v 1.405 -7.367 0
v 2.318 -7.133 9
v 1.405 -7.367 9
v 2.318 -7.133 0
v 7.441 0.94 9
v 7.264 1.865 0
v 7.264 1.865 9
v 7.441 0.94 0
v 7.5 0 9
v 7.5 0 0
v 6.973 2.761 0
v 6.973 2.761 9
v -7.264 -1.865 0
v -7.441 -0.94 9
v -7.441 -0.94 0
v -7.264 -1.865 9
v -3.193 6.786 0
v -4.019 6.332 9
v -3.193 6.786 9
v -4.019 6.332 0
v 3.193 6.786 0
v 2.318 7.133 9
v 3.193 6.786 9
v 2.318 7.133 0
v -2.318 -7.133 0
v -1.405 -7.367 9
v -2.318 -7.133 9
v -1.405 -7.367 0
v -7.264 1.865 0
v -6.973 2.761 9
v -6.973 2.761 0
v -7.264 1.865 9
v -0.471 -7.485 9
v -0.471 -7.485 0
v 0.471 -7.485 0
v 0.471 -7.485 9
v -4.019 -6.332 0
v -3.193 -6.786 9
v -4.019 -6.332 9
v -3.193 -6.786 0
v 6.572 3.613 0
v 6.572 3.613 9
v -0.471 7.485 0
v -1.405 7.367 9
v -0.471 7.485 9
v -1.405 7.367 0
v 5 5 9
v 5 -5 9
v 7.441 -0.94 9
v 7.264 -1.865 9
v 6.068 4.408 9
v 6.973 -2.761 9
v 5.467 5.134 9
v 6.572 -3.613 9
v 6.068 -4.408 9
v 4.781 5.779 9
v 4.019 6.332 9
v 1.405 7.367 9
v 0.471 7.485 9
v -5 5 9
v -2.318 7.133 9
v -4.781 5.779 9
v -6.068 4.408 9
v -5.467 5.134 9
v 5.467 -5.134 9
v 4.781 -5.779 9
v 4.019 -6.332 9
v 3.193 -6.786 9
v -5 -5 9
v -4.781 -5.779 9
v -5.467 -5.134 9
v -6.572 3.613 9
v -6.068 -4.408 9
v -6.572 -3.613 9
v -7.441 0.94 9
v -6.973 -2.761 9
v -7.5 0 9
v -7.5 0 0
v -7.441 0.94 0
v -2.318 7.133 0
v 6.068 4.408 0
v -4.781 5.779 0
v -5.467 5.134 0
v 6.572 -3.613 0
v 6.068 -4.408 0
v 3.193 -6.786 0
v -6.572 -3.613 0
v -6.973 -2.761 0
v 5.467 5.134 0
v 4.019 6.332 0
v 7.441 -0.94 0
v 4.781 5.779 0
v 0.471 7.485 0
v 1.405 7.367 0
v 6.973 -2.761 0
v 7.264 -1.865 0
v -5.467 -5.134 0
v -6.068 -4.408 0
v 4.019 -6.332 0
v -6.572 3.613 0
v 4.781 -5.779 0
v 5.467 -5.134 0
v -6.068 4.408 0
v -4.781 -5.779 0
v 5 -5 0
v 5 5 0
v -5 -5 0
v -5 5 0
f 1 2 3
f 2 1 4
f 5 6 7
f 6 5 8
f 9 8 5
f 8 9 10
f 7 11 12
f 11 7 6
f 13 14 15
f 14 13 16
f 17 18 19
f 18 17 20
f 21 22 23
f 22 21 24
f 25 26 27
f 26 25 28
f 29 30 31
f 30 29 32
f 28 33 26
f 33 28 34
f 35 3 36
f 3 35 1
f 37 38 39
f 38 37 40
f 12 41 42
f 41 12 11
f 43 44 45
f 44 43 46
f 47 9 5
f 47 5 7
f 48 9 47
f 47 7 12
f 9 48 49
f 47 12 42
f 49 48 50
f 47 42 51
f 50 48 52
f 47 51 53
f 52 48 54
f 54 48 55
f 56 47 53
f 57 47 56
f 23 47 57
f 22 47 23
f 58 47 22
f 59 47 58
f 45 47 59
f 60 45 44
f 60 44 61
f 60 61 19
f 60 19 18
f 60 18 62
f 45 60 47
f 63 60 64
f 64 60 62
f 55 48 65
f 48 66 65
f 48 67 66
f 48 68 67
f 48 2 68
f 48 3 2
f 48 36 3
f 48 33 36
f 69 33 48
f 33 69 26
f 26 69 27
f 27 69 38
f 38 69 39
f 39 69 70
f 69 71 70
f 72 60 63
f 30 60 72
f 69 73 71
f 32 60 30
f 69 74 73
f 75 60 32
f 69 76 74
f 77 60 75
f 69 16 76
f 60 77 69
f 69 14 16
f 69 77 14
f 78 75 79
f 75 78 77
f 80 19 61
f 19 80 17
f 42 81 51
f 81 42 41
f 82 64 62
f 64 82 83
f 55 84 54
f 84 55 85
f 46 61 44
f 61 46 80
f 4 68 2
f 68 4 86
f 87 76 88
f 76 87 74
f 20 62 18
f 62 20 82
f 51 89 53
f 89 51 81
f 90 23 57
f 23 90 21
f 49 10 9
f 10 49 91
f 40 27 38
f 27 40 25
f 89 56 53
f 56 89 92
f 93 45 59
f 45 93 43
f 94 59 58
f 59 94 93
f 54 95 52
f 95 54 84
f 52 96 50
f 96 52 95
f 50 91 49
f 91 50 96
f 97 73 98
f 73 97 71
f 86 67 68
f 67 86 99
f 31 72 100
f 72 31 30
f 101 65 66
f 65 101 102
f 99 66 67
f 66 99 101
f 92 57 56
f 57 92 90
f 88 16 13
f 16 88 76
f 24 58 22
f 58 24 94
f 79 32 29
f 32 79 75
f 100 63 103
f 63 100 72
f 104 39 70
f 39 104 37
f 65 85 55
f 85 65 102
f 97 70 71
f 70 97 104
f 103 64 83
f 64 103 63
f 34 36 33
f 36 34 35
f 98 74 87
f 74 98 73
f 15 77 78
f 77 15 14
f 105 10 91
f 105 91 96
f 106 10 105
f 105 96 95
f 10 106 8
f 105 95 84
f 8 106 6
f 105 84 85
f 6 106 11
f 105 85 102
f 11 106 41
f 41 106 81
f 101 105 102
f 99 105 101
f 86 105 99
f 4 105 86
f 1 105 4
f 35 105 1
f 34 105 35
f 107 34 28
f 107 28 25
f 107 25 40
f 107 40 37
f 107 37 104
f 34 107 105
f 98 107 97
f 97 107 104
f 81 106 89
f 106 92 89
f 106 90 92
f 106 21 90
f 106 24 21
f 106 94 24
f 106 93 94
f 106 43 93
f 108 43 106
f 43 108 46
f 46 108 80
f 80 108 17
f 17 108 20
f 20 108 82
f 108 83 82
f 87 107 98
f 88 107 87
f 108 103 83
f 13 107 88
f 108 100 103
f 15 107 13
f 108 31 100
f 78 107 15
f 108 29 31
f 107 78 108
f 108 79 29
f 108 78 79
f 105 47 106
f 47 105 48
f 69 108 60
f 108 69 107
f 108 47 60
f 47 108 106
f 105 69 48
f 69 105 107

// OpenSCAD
// file: tolerance.scad
// Author: Mihai Oltean, https://mihaioltean.github.io, mihai.oltean@gmail.com
// More details: https://jenny5.org, https://jenny5-robot.github.io/
// Source code: github.com/jenny5-robot
// MIT License
//--------------------------------------------------------------

tolerance = 0.1;
display_tolerance = 1;

overlap_tolerance = 0.01;

tolerance_z = [0, 0, tolerance];
tolerance_x = [tolerance, 0, 0];
tolerance_y = [0, tolerance, 0];

display_tolerance_z = [0, 0, display_tolerance];
display_tolerance_x = [display_tolerance, 0, 0];
display_tolerance_y = [0, display_tolerance, 0];

display_tolerance_xz = [display_tolerance, 0, display_tolerance];
display_tolerance_xy = [display_tolerance, display_tolerance, 0];
display_tolerance_yz = [0, display_tolerance, display_tolerance];

display_tolerance_xyz = [display_tolerance, display_tolerance, display_tolerance];
// file: params_basic_components.scad
// Author: Mihai Oltean, https://mihaioltean.github.io, mihai.oltean@gmail.com
// More details: https://jenny5.org, https://jenny5-robot.github.io/
// Source code: github.com/jenny5-robot
// MIT License
//--------------------------------------------------------------

spring_length = 20;

smooth_rod_8_radius = 4;
smooth_rod_10_radius = 5;
smooth_rod_12_radius = 6;

wall_thick_1 = 1;
wall_thick_2 = 2;
wall_thick_3 = 3;
wall_thick_4 = 4;
wall_thick_5 = 5;
wall_thick_5_5 = 5.5;
wall_thick_6 = 6;
wall_thick_7 = 7;
wall_thick_8 = 8;
wall_thick_9 = 9;
wall_thick_10 = 10;
wall_thick_12 = 12;
// main file
// Author: Mihai Oltean, https://mihaioltean.github.io, mihai.oltean@gmail.com
// More details: https://jenny5.org, https://jenny5-robot.github.io/
// Source code: github.com/jenny5-robot
// MIT License
//--------------------------------------------------------------

include <params_basic_components.scad>
include <tolerance.scad>

//--------------------------------------------------------------
module bush_bearing_bone(radial_bearing_radius = 7.5, bone_edge = 10, height = 9)
{
    difference(){
        cylinder(h = height, r = radial_bearing_radius, $fn = 50);
        translate ([-bone_edge / 2, -bone_edge / 2, 0] - display_tolerance_z) cube ([bone_edge, bone_edge, height] + 2 * display_tolerance_z);
    }
}
//--------------------------------------------------------------
bush_bearing_bone();
